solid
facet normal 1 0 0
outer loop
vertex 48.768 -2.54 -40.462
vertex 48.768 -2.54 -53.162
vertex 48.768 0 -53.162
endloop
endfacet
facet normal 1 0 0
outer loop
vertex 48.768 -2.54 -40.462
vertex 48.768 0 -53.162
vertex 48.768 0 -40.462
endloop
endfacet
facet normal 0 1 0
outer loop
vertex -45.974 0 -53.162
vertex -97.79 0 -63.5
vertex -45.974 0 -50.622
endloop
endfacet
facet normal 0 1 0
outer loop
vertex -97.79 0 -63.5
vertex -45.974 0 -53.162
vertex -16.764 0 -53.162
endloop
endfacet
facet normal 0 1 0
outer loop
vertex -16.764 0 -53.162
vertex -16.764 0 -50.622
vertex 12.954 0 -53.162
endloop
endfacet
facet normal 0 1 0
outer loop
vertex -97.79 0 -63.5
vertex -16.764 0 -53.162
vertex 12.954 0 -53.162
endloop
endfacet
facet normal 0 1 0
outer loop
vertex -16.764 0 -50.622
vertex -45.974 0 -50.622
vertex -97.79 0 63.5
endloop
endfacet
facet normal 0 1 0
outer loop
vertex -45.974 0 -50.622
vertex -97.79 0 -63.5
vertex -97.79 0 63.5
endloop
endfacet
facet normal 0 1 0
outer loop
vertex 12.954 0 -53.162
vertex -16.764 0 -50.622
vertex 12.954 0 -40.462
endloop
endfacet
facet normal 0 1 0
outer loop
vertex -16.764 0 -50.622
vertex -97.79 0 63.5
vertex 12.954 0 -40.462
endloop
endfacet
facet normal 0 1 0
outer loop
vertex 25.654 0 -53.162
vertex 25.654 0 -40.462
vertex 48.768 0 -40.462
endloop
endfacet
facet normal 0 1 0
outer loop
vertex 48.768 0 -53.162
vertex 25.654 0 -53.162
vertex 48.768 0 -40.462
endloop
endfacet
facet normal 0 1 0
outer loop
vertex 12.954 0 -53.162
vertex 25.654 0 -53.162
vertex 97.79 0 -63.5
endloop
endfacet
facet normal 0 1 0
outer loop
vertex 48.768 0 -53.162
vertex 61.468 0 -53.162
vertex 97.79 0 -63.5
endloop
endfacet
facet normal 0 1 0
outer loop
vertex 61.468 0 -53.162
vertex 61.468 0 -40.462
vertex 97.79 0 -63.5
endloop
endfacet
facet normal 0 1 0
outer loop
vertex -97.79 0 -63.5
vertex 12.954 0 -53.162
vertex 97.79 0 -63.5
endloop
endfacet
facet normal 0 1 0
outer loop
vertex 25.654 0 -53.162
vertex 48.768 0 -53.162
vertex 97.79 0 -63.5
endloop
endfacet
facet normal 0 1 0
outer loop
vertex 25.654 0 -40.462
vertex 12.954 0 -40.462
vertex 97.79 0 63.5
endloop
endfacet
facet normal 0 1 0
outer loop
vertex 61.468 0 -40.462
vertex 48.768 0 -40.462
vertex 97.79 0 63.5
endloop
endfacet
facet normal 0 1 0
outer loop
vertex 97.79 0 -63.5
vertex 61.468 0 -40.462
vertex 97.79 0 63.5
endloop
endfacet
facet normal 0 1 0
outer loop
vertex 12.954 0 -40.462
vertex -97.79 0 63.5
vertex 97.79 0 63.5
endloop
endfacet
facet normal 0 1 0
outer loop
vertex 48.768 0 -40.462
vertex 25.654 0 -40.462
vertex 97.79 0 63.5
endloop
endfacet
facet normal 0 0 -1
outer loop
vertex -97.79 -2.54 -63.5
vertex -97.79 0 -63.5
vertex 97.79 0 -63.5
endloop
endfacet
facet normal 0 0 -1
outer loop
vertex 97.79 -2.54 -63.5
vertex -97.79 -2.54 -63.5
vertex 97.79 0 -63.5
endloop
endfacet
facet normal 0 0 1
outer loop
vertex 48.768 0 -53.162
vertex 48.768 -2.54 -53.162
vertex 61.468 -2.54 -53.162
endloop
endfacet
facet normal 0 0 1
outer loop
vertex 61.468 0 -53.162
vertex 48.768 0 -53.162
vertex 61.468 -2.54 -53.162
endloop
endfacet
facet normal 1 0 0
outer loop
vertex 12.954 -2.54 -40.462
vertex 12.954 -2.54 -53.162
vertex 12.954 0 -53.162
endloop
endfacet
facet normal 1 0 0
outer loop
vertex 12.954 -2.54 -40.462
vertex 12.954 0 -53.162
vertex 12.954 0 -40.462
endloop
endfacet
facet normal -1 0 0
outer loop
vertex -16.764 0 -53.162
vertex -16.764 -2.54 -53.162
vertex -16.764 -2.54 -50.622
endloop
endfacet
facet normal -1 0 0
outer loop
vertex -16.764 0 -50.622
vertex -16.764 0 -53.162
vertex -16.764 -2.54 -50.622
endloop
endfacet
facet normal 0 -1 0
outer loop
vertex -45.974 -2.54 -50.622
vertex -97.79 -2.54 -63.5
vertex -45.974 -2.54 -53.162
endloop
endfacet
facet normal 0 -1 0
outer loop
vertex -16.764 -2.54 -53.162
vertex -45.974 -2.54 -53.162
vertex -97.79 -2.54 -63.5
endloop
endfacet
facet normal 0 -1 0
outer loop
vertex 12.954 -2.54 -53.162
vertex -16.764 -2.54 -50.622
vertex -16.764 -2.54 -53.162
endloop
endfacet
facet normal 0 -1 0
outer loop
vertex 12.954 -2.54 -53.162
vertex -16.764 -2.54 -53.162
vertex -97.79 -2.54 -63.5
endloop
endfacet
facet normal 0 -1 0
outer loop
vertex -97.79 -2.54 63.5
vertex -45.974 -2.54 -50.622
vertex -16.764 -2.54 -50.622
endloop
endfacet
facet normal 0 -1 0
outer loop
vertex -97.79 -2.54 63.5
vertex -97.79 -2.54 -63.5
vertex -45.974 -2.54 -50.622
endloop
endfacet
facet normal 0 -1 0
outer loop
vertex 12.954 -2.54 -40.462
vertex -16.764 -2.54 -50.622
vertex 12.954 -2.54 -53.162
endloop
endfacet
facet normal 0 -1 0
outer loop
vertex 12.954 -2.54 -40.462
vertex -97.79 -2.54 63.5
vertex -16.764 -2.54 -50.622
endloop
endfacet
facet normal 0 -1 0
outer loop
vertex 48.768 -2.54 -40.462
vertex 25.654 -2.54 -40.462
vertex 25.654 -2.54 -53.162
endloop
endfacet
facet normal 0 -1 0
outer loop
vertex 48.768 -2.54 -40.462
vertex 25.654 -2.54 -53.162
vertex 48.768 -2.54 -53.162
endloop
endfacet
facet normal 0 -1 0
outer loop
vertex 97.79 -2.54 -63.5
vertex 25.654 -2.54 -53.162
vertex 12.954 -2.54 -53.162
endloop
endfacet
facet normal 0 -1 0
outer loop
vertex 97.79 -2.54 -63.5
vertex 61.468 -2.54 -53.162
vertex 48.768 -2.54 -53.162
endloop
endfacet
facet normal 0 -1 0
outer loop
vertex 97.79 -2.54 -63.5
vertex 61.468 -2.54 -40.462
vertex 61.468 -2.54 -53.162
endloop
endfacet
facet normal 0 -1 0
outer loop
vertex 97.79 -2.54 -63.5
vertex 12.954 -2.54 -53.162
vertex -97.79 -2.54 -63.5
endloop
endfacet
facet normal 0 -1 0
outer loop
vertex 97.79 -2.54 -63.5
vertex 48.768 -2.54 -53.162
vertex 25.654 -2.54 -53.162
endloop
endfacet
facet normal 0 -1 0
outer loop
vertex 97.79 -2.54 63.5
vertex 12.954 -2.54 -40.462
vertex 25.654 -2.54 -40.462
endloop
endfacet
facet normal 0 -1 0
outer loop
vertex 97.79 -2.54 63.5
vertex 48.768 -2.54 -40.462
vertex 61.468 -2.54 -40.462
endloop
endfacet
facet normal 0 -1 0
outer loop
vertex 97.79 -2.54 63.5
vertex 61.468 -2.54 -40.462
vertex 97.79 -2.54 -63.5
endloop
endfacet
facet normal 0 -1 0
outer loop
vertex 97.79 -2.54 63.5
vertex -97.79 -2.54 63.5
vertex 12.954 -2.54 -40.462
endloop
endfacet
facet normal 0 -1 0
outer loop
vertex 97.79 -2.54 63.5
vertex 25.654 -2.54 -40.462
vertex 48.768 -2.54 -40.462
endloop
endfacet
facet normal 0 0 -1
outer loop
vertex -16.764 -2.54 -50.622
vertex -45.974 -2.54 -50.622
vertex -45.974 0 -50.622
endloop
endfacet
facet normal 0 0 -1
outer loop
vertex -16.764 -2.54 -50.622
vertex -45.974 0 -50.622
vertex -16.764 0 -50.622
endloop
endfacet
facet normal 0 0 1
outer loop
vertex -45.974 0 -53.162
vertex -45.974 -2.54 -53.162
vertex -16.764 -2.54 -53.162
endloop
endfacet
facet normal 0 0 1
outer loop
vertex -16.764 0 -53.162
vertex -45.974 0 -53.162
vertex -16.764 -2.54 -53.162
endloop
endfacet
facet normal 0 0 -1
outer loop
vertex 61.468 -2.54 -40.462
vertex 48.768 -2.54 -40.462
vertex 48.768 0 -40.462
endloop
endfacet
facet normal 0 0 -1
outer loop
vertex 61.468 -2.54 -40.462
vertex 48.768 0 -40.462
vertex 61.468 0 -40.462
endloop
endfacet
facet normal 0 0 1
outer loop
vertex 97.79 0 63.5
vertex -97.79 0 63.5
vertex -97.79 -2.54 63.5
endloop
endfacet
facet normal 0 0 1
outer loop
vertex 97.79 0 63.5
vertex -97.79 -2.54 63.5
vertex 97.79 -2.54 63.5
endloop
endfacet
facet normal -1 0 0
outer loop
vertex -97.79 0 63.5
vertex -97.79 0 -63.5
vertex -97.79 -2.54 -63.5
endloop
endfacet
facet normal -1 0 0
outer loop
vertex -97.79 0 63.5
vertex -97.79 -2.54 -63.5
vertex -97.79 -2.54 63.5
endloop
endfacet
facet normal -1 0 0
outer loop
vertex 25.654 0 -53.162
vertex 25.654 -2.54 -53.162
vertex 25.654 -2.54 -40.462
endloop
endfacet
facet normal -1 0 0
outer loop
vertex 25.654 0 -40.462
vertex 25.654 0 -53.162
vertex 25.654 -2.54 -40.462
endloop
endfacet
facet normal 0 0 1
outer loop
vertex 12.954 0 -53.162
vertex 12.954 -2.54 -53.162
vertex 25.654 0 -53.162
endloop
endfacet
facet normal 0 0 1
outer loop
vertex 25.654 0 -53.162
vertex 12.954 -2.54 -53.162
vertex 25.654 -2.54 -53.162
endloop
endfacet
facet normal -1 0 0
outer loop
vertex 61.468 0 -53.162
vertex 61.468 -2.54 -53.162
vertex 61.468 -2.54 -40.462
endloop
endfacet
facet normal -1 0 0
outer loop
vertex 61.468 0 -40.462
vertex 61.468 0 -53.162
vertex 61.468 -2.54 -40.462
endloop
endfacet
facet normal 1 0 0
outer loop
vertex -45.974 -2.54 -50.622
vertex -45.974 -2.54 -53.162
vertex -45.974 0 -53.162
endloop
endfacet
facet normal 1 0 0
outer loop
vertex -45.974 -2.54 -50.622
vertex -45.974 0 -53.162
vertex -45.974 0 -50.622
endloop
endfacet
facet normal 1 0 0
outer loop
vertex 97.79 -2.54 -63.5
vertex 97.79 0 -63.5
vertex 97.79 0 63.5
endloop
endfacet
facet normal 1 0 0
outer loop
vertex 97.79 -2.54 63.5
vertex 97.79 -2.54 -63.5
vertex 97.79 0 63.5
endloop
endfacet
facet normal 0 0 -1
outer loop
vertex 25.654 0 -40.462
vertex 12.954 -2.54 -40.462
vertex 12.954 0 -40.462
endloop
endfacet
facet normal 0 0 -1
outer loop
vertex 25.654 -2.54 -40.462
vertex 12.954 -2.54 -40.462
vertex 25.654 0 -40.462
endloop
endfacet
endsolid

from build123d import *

# Parameters (mm, degrees)
F0_W     = 195.58
F0_H     = 127
F1_DEPTH = 2.54
F2_W     = 29.21
F2_H     = 2.54
F2_W_2   = 12.7
F2_H_2   = 12.7
F3_DEPTH = 2.54


with BuildPart() as f1:
    # F0 (on Front) → F1 (new body)
    with BuildSketch(Plane.XZ):
        Rectangle(F0_W, F0_H)
    extrude(amount=F1_DEPTH)

    # F2 (on face) → F3 (cut)
    with BuildSketch(Plane.XZ.offset(2.54)):
        with Locations((-31.369, -51.8922)):
            Rectangle(F2_W, F2_H)
        with Locations((19.304, -46.8122)):
            Rectangle(F2_W_2, F2_H_2)
        with Locations((55.118, -46.8122)):
            Rectangle(F2_W_2, F2_H_2)
    extrude(amount=-F3_DEPTH, mode=Mode.SUBTRACT)


solid = f1.part
